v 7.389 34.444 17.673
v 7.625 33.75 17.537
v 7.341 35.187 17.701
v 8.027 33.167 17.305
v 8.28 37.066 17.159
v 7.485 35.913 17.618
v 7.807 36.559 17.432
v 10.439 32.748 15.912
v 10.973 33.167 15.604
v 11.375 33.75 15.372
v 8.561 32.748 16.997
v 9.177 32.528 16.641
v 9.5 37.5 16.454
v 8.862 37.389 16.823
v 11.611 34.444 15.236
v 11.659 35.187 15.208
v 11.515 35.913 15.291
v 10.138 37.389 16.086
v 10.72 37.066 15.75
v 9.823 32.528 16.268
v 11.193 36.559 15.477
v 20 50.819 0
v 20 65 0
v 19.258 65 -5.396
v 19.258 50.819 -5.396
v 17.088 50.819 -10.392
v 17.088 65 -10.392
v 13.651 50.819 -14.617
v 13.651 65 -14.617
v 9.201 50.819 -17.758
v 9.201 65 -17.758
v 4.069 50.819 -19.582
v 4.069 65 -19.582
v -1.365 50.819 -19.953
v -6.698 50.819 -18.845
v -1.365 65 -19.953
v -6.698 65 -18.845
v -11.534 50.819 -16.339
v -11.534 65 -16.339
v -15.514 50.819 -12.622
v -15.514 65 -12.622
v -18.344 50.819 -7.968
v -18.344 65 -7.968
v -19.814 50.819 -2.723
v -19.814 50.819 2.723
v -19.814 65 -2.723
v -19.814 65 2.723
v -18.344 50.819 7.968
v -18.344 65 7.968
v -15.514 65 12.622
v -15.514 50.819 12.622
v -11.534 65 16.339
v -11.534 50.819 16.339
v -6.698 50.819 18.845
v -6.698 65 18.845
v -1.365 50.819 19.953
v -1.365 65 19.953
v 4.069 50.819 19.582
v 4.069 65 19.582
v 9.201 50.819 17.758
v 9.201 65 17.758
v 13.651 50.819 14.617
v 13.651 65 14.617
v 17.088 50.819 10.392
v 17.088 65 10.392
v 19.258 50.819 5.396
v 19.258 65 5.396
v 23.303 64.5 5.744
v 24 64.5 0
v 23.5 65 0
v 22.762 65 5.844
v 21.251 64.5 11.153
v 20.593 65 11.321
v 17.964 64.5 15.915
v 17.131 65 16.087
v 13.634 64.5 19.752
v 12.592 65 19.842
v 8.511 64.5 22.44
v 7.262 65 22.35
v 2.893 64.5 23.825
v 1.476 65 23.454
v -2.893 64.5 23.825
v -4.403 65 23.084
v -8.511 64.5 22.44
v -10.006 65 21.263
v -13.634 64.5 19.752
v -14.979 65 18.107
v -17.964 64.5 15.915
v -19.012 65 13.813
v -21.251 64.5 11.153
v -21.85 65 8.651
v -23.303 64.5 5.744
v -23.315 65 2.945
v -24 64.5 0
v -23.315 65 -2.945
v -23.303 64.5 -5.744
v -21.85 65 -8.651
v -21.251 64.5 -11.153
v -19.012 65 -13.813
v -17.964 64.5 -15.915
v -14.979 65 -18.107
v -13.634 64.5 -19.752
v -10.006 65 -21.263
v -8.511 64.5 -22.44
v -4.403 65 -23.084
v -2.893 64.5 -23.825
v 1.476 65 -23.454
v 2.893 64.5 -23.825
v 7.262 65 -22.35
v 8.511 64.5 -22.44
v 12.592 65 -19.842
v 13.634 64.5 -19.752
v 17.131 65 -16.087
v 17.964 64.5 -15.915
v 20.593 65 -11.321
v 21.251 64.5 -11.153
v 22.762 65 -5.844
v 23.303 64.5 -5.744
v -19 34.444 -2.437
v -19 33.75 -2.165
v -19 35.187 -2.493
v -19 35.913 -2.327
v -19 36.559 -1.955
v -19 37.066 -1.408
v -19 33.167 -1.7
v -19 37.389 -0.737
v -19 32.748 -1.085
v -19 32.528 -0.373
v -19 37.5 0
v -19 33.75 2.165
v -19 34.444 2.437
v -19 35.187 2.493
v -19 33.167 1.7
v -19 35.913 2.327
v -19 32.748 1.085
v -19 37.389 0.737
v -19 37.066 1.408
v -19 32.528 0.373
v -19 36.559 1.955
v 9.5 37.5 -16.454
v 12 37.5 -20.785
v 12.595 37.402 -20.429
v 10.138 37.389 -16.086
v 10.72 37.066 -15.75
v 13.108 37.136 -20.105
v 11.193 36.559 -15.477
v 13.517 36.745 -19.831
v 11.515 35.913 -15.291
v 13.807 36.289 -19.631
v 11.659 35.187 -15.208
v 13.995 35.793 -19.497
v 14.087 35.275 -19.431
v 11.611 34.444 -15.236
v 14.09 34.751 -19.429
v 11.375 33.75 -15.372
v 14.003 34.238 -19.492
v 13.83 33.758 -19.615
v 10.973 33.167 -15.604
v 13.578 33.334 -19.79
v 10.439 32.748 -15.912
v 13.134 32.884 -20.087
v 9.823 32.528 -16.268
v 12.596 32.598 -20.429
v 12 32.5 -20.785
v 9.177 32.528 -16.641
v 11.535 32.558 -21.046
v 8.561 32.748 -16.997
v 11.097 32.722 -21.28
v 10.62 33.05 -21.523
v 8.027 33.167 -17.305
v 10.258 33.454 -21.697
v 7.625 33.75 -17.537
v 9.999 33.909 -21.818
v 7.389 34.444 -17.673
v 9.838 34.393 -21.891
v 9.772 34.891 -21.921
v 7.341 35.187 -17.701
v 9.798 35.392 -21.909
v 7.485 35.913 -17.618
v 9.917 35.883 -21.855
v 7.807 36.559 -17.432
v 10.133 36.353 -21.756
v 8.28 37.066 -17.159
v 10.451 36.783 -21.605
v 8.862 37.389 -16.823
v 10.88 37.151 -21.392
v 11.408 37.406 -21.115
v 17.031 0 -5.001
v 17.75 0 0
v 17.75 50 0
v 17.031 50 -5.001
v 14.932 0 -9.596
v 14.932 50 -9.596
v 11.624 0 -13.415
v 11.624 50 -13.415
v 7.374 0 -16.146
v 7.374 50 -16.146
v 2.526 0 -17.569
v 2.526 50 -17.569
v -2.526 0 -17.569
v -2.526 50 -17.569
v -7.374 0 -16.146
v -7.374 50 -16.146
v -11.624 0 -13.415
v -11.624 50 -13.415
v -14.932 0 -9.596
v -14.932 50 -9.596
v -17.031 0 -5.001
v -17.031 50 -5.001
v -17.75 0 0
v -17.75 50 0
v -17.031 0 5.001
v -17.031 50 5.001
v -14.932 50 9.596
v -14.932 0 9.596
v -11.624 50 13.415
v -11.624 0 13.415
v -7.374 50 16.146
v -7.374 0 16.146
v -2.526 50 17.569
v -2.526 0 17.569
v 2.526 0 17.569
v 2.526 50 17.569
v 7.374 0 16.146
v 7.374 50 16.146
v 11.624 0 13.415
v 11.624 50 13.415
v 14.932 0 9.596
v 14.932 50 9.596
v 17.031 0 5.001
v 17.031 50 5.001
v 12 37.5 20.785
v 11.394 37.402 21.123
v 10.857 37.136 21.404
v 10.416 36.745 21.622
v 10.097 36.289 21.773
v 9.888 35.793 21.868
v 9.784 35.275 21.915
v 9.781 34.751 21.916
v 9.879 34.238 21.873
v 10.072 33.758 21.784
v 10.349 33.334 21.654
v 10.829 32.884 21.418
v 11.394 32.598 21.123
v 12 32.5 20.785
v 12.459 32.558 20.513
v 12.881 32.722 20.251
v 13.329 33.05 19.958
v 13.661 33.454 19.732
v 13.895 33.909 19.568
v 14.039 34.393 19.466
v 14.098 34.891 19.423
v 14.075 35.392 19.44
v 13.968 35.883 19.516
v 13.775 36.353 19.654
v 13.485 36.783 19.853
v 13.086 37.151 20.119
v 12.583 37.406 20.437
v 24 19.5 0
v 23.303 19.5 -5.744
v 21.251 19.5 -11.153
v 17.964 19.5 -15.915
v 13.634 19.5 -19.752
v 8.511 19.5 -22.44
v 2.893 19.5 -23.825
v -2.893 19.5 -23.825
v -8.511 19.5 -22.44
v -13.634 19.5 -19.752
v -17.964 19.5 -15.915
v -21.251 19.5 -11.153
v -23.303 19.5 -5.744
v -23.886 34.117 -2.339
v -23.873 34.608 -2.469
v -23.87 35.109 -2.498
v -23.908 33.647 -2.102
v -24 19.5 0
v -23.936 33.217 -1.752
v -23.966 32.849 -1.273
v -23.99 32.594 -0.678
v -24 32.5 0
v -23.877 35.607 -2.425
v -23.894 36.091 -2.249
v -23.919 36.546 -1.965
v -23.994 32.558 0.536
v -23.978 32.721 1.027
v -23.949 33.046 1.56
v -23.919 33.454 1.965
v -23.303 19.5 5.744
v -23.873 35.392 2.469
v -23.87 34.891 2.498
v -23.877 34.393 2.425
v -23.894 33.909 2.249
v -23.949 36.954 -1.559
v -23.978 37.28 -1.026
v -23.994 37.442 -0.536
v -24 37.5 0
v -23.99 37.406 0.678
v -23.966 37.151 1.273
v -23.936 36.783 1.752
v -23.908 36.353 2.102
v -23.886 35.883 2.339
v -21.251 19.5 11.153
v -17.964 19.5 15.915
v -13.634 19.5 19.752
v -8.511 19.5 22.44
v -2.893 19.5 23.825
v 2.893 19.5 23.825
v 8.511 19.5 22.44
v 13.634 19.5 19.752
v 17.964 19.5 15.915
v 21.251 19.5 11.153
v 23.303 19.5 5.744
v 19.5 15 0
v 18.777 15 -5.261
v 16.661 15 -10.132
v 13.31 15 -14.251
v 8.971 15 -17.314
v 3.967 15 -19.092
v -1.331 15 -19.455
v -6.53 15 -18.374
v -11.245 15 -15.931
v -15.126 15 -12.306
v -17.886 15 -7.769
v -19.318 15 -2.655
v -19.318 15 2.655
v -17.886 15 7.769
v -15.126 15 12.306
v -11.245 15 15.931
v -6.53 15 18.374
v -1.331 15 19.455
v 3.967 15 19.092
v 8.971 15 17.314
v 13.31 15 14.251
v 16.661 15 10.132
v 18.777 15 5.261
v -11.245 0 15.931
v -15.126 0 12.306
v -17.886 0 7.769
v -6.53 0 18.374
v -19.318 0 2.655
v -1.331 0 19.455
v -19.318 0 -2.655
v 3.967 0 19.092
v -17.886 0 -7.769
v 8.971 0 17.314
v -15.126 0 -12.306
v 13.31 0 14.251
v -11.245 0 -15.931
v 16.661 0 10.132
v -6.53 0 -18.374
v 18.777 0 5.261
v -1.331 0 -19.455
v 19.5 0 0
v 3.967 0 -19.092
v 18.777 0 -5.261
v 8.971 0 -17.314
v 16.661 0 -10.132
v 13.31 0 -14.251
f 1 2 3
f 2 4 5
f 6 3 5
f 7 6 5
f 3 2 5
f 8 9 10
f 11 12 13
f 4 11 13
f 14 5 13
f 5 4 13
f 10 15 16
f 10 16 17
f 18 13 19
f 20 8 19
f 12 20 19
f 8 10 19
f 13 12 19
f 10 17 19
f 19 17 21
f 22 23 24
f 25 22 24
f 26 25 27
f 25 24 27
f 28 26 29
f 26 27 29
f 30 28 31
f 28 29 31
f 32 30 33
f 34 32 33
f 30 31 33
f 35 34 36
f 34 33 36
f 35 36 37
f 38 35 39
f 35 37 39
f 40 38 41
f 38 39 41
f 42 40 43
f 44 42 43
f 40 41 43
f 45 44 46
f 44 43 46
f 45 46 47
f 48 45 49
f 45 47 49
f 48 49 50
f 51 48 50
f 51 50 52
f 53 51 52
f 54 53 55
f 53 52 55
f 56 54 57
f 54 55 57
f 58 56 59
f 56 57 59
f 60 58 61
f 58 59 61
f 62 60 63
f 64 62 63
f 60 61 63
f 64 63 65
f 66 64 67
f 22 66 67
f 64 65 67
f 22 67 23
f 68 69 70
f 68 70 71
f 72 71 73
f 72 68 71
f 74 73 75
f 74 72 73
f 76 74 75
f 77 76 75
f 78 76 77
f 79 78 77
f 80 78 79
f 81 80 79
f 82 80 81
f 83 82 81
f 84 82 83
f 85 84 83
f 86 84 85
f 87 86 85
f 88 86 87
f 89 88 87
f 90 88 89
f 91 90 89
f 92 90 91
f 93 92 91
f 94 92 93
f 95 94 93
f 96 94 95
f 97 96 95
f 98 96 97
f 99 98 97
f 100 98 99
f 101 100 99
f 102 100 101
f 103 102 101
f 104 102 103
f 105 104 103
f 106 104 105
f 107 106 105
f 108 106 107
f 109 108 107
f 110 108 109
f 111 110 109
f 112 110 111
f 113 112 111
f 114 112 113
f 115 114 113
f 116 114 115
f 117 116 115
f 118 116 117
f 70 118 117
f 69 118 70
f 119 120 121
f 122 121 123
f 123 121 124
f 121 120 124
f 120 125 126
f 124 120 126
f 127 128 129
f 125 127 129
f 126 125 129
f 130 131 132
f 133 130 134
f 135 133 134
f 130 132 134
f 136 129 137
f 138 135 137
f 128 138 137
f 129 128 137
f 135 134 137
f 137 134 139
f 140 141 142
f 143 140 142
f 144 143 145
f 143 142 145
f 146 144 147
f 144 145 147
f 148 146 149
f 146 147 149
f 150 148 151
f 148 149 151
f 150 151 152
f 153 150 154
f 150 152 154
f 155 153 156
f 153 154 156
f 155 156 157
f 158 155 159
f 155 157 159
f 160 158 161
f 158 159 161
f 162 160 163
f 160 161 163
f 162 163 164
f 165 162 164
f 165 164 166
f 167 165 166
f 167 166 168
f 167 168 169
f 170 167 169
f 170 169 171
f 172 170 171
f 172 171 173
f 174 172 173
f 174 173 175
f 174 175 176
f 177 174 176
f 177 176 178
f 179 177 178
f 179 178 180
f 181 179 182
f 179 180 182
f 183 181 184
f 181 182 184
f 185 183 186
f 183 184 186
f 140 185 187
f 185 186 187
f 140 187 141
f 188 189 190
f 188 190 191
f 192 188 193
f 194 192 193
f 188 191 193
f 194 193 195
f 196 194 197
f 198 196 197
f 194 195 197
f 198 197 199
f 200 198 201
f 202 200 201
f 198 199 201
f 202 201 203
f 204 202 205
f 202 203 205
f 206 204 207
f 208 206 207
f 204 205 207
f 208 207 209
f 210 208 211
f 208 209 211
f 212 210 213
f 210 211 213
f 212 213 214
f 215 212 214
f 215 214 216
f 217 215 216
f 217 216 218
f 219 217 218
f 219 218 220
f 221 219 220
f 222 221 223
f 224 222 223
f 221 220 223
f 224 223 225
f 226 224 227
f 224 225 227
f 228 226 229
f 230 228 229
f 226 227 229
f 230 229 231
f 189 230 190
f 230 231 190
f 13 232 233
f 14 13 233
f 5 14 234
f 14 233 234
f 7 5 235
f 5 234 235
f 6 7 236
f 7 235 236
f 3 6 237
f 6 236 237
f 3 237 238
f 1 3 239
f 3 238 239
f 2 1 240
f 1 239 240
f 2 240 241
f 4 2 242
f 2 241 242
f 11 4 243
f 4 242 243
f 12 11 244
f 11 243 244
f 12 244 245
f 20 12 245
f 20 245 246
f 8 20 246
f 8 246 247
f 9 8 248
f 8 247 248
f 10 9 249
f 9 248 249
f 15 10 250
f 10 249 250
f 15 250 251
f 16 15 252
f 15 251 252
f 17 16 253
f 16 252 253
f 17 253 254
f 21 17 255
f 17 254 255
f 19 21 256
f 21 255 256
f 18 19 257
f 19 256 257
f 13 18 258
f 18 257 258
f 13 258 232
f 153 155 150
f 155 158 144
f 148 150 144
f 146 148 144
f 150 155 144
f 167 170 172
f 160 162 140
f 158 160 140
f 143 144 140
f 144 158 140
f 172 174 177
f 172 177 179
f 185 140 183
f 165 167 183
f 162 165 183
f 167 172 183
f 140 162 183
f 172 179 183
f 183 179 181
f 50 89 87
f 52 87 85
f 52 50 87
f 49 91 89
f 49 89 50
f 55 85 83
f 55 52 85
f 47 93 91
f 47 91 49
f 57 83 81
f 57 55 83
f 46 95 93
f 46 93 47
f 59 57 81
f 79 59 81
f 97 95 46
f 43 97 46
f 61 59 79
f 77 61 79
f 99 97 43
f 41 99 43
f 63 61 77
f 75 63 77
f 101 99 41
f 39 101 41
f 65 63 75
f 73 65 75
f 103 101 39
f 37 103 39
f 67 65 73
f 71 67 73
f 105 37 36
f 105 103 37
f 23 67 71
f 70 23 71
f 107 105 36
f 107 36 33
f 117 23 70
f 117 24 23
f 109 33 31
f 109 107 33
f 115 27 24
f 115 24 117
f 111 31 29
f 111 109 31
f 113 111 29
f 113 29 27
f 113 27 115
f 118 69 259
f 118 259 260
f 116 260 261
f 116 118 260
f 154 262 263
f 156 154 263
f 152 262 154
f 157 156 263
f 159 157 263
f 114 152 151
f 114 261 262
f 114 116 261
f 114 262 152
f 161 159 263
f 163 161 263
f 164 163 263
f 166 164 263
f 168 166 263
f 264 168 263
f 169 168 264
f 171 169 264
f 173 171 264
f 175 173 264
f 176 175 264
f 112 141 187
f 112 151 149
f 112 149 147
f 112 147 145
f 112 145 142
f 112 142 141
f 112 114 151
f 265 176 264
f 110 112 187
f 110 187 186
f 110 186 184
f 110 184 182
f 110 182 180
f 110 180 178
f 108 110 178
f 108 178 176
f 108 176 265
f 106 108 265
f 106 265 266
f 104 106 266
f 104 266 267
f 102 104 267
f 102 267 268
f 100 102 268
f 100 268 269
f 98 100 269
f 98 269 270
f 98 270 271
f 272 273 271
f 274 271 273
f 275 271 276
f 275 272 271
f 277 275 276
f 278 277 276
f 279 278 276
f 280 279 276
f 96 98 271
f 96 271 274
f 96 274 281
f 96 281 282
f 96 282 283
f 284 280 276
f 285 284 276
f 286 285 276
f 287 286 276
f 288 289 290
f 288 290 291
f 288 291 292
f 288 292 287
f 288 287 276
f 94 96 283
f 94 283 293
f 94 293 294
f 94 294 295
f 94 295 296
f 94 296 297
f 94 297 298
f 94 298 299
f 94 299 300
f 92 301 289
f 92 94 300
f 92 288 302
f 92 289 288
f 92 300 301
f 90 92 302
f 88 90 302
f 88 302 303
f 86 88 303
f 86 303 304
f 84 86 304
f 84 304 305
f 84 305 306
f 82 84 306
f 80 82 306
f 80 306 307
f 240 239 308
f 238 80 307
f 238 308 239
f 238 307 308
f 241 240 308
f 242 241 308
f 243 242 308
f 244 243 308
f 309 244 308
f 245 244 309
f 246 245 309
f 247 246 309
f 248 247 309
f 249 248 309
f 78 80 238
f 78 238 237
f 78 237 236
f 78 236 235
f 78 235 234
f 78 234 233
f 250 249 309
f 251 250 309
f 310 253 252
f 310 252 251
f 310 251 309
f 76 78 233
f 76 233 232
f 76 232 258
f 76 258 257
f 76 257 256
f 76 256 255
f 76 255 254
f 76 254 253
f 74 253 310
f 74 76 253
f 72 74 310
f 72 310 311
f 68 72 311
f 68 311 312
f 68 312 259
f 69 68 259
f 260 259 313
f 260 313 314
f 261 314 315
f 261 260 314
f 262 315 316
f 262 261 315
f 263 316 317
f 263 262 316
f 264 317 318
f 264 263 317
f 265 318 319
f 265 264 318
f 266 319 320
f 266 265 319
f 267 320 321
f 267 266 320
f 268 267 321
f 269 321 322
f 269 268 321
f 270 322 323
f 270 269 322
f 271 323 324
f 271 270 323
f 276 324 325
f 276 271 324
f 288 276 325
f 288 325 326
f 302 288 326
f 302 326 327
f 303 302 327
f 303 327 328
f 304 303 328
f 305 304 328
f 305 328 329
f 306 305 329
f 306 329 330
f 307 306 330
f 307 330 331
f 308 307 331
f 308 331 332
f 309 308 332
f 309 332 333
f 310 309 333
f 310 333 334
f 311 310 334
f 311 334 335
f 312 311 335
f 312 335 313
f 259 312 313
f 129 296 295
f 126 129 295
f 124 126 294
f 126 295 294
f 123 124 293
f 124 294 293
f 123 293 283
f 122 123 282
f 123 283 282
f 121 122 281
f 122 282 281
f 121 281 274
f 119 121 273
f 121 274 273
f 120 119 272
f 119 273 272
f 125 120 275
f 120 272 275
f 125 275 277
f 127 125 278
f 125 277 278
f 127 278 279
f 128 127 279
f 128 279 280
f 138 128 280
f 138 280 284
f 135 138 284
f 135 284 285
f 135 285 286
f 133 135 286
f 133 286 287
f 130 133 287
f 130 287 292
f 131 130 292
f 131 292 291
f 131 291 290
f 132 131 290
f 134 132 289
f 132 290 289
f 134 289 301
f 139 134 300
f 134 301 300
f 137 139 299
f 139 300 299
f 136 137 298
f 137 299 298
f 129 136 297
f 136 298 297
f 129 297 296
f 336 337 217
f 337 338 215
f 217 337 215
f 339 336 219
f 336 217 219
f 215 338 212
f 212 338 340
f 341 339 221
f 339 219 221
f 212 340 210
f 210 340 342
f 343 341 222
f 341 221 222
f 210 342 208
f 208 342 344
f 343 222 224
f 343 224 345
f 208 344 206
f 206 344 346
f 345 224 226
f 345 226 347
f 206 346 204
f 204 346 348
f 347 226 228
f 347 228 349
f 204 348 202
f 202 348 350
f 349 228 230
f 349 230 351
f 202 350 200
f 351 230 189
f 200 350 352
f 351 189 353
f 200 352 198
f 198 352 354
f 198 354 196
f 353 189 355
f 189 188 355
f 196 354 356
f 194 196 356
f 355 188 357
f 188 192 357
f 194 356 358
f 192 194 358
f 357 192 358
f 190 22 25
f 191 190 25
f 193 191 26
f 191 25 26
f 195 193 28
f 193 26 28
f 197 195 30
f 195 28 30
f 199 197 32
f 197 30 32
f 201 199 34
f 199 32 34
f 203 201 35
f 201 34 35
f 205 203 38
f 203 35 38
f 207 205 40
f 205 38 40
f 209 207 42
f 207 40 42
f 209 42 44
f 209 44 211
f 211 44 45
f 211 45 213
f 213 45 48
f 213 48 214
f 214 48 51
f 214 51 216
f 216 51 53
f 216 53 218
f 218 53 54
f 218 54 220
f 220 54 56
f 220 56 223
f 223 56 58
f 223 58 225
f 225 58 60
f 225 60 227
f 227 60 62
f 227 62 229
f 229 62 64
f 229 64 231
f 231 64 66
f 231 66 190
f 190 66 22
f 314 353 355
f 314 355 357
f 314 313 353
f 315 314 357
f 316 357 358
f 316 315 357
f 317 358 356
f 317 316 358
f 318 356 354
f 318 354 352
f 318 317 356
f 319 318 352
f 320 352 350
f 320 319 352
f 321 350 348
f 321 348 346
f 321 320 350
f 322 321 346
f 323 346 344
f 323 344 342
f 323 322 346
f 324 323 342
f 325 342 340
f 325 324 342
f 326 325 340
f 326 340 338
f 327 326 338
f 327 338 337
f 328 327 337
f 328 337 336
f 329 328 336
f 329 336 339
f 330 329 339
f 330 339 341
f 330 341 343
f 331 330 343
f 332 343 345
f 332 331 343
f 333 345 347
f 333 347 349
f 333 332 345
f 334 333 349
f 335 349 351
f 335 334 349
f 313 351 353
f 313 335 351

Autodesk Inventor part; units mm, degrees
ref_plane "XZ Plane" through (0, 0, 0) normal (0, 1, 0) x (-1, 0, 0)
ref_plane "XY Plane" through (0, 0, 0) normal (0, 0, 1) x (1, 0, 0)
sketch "Sketch3" plane through (0, 0, 0) normal (0, 0, 1) x (1, 0, 0)
  line L0 (0, 0) -> (0, 23.925) construction
  line L1 (17.75, 0) -> (17.75, 50)
  line L2 (17.75, 0) -> (19.5, 0)
  line L3 (19.5, 0) -> (19.5, 15)
  line L4 (19.5, 15) -> (24, 15)
  line L5 (24, 15) -> (24, 65)
  line L6 (17.75, 50) -> (20, 50.8189)
  line L7 (20, 50.8189) -> (20, 65)
  line L8 (20, 65) -> (24, 65)
  dimension "d9" = 35.5
  dimension "d10" = 39
  dimension "d11" = 40
  dimension "d13" = 70
  dimension "d14" = 48
  dimension "d15" = 15
  dimension "d16" = 50
  dimension "d27" = 65
revolve "Revolution2" add sketch "Sketch3" angle 360 about axis through (0, 0, 0) along (0, 1, 0)
chamfer "Chamfer1" distance 4.5 angle 45 1 edges at (-24, 15, 0)
thread "Thread1" size "M48x2" class "6g" standard "ANSI Metric M Profile" length 15
chamfer "Chamfer2" distance 0.5 angle 45 1 edges at (-24, 65, 0)
ref_plane "Work Plane1" through (-24, 40, 0) normal (1, 0, 0) x (0, 1, 0)
sketch "Sketch4" plane through (-24, 40, 0) normal (1, 0, 0) x (0, 1, 0)
  circle A0 centre (-5, 0) radius 2.5
  line L0 (25, 23.5) -> (25, -23.5) projected
  point P0 (-40, 0)
  dimension "d28" = 5
  dimension "d29" = 30
extrude "Extrusion1" cut sketch "Sketch4" along normal blind 5
thread "Thread2" size "M5x0.8" class "6H" standard "ANSI Metric M Profile" full length
pattern_circular "Circular Pattern1" count 3 over 360 about axis through (0, 40, 0) along (0, 1, 0) of "Extrusion1"
properties part number "OringNut" material "Stainless Steel, 440C"
